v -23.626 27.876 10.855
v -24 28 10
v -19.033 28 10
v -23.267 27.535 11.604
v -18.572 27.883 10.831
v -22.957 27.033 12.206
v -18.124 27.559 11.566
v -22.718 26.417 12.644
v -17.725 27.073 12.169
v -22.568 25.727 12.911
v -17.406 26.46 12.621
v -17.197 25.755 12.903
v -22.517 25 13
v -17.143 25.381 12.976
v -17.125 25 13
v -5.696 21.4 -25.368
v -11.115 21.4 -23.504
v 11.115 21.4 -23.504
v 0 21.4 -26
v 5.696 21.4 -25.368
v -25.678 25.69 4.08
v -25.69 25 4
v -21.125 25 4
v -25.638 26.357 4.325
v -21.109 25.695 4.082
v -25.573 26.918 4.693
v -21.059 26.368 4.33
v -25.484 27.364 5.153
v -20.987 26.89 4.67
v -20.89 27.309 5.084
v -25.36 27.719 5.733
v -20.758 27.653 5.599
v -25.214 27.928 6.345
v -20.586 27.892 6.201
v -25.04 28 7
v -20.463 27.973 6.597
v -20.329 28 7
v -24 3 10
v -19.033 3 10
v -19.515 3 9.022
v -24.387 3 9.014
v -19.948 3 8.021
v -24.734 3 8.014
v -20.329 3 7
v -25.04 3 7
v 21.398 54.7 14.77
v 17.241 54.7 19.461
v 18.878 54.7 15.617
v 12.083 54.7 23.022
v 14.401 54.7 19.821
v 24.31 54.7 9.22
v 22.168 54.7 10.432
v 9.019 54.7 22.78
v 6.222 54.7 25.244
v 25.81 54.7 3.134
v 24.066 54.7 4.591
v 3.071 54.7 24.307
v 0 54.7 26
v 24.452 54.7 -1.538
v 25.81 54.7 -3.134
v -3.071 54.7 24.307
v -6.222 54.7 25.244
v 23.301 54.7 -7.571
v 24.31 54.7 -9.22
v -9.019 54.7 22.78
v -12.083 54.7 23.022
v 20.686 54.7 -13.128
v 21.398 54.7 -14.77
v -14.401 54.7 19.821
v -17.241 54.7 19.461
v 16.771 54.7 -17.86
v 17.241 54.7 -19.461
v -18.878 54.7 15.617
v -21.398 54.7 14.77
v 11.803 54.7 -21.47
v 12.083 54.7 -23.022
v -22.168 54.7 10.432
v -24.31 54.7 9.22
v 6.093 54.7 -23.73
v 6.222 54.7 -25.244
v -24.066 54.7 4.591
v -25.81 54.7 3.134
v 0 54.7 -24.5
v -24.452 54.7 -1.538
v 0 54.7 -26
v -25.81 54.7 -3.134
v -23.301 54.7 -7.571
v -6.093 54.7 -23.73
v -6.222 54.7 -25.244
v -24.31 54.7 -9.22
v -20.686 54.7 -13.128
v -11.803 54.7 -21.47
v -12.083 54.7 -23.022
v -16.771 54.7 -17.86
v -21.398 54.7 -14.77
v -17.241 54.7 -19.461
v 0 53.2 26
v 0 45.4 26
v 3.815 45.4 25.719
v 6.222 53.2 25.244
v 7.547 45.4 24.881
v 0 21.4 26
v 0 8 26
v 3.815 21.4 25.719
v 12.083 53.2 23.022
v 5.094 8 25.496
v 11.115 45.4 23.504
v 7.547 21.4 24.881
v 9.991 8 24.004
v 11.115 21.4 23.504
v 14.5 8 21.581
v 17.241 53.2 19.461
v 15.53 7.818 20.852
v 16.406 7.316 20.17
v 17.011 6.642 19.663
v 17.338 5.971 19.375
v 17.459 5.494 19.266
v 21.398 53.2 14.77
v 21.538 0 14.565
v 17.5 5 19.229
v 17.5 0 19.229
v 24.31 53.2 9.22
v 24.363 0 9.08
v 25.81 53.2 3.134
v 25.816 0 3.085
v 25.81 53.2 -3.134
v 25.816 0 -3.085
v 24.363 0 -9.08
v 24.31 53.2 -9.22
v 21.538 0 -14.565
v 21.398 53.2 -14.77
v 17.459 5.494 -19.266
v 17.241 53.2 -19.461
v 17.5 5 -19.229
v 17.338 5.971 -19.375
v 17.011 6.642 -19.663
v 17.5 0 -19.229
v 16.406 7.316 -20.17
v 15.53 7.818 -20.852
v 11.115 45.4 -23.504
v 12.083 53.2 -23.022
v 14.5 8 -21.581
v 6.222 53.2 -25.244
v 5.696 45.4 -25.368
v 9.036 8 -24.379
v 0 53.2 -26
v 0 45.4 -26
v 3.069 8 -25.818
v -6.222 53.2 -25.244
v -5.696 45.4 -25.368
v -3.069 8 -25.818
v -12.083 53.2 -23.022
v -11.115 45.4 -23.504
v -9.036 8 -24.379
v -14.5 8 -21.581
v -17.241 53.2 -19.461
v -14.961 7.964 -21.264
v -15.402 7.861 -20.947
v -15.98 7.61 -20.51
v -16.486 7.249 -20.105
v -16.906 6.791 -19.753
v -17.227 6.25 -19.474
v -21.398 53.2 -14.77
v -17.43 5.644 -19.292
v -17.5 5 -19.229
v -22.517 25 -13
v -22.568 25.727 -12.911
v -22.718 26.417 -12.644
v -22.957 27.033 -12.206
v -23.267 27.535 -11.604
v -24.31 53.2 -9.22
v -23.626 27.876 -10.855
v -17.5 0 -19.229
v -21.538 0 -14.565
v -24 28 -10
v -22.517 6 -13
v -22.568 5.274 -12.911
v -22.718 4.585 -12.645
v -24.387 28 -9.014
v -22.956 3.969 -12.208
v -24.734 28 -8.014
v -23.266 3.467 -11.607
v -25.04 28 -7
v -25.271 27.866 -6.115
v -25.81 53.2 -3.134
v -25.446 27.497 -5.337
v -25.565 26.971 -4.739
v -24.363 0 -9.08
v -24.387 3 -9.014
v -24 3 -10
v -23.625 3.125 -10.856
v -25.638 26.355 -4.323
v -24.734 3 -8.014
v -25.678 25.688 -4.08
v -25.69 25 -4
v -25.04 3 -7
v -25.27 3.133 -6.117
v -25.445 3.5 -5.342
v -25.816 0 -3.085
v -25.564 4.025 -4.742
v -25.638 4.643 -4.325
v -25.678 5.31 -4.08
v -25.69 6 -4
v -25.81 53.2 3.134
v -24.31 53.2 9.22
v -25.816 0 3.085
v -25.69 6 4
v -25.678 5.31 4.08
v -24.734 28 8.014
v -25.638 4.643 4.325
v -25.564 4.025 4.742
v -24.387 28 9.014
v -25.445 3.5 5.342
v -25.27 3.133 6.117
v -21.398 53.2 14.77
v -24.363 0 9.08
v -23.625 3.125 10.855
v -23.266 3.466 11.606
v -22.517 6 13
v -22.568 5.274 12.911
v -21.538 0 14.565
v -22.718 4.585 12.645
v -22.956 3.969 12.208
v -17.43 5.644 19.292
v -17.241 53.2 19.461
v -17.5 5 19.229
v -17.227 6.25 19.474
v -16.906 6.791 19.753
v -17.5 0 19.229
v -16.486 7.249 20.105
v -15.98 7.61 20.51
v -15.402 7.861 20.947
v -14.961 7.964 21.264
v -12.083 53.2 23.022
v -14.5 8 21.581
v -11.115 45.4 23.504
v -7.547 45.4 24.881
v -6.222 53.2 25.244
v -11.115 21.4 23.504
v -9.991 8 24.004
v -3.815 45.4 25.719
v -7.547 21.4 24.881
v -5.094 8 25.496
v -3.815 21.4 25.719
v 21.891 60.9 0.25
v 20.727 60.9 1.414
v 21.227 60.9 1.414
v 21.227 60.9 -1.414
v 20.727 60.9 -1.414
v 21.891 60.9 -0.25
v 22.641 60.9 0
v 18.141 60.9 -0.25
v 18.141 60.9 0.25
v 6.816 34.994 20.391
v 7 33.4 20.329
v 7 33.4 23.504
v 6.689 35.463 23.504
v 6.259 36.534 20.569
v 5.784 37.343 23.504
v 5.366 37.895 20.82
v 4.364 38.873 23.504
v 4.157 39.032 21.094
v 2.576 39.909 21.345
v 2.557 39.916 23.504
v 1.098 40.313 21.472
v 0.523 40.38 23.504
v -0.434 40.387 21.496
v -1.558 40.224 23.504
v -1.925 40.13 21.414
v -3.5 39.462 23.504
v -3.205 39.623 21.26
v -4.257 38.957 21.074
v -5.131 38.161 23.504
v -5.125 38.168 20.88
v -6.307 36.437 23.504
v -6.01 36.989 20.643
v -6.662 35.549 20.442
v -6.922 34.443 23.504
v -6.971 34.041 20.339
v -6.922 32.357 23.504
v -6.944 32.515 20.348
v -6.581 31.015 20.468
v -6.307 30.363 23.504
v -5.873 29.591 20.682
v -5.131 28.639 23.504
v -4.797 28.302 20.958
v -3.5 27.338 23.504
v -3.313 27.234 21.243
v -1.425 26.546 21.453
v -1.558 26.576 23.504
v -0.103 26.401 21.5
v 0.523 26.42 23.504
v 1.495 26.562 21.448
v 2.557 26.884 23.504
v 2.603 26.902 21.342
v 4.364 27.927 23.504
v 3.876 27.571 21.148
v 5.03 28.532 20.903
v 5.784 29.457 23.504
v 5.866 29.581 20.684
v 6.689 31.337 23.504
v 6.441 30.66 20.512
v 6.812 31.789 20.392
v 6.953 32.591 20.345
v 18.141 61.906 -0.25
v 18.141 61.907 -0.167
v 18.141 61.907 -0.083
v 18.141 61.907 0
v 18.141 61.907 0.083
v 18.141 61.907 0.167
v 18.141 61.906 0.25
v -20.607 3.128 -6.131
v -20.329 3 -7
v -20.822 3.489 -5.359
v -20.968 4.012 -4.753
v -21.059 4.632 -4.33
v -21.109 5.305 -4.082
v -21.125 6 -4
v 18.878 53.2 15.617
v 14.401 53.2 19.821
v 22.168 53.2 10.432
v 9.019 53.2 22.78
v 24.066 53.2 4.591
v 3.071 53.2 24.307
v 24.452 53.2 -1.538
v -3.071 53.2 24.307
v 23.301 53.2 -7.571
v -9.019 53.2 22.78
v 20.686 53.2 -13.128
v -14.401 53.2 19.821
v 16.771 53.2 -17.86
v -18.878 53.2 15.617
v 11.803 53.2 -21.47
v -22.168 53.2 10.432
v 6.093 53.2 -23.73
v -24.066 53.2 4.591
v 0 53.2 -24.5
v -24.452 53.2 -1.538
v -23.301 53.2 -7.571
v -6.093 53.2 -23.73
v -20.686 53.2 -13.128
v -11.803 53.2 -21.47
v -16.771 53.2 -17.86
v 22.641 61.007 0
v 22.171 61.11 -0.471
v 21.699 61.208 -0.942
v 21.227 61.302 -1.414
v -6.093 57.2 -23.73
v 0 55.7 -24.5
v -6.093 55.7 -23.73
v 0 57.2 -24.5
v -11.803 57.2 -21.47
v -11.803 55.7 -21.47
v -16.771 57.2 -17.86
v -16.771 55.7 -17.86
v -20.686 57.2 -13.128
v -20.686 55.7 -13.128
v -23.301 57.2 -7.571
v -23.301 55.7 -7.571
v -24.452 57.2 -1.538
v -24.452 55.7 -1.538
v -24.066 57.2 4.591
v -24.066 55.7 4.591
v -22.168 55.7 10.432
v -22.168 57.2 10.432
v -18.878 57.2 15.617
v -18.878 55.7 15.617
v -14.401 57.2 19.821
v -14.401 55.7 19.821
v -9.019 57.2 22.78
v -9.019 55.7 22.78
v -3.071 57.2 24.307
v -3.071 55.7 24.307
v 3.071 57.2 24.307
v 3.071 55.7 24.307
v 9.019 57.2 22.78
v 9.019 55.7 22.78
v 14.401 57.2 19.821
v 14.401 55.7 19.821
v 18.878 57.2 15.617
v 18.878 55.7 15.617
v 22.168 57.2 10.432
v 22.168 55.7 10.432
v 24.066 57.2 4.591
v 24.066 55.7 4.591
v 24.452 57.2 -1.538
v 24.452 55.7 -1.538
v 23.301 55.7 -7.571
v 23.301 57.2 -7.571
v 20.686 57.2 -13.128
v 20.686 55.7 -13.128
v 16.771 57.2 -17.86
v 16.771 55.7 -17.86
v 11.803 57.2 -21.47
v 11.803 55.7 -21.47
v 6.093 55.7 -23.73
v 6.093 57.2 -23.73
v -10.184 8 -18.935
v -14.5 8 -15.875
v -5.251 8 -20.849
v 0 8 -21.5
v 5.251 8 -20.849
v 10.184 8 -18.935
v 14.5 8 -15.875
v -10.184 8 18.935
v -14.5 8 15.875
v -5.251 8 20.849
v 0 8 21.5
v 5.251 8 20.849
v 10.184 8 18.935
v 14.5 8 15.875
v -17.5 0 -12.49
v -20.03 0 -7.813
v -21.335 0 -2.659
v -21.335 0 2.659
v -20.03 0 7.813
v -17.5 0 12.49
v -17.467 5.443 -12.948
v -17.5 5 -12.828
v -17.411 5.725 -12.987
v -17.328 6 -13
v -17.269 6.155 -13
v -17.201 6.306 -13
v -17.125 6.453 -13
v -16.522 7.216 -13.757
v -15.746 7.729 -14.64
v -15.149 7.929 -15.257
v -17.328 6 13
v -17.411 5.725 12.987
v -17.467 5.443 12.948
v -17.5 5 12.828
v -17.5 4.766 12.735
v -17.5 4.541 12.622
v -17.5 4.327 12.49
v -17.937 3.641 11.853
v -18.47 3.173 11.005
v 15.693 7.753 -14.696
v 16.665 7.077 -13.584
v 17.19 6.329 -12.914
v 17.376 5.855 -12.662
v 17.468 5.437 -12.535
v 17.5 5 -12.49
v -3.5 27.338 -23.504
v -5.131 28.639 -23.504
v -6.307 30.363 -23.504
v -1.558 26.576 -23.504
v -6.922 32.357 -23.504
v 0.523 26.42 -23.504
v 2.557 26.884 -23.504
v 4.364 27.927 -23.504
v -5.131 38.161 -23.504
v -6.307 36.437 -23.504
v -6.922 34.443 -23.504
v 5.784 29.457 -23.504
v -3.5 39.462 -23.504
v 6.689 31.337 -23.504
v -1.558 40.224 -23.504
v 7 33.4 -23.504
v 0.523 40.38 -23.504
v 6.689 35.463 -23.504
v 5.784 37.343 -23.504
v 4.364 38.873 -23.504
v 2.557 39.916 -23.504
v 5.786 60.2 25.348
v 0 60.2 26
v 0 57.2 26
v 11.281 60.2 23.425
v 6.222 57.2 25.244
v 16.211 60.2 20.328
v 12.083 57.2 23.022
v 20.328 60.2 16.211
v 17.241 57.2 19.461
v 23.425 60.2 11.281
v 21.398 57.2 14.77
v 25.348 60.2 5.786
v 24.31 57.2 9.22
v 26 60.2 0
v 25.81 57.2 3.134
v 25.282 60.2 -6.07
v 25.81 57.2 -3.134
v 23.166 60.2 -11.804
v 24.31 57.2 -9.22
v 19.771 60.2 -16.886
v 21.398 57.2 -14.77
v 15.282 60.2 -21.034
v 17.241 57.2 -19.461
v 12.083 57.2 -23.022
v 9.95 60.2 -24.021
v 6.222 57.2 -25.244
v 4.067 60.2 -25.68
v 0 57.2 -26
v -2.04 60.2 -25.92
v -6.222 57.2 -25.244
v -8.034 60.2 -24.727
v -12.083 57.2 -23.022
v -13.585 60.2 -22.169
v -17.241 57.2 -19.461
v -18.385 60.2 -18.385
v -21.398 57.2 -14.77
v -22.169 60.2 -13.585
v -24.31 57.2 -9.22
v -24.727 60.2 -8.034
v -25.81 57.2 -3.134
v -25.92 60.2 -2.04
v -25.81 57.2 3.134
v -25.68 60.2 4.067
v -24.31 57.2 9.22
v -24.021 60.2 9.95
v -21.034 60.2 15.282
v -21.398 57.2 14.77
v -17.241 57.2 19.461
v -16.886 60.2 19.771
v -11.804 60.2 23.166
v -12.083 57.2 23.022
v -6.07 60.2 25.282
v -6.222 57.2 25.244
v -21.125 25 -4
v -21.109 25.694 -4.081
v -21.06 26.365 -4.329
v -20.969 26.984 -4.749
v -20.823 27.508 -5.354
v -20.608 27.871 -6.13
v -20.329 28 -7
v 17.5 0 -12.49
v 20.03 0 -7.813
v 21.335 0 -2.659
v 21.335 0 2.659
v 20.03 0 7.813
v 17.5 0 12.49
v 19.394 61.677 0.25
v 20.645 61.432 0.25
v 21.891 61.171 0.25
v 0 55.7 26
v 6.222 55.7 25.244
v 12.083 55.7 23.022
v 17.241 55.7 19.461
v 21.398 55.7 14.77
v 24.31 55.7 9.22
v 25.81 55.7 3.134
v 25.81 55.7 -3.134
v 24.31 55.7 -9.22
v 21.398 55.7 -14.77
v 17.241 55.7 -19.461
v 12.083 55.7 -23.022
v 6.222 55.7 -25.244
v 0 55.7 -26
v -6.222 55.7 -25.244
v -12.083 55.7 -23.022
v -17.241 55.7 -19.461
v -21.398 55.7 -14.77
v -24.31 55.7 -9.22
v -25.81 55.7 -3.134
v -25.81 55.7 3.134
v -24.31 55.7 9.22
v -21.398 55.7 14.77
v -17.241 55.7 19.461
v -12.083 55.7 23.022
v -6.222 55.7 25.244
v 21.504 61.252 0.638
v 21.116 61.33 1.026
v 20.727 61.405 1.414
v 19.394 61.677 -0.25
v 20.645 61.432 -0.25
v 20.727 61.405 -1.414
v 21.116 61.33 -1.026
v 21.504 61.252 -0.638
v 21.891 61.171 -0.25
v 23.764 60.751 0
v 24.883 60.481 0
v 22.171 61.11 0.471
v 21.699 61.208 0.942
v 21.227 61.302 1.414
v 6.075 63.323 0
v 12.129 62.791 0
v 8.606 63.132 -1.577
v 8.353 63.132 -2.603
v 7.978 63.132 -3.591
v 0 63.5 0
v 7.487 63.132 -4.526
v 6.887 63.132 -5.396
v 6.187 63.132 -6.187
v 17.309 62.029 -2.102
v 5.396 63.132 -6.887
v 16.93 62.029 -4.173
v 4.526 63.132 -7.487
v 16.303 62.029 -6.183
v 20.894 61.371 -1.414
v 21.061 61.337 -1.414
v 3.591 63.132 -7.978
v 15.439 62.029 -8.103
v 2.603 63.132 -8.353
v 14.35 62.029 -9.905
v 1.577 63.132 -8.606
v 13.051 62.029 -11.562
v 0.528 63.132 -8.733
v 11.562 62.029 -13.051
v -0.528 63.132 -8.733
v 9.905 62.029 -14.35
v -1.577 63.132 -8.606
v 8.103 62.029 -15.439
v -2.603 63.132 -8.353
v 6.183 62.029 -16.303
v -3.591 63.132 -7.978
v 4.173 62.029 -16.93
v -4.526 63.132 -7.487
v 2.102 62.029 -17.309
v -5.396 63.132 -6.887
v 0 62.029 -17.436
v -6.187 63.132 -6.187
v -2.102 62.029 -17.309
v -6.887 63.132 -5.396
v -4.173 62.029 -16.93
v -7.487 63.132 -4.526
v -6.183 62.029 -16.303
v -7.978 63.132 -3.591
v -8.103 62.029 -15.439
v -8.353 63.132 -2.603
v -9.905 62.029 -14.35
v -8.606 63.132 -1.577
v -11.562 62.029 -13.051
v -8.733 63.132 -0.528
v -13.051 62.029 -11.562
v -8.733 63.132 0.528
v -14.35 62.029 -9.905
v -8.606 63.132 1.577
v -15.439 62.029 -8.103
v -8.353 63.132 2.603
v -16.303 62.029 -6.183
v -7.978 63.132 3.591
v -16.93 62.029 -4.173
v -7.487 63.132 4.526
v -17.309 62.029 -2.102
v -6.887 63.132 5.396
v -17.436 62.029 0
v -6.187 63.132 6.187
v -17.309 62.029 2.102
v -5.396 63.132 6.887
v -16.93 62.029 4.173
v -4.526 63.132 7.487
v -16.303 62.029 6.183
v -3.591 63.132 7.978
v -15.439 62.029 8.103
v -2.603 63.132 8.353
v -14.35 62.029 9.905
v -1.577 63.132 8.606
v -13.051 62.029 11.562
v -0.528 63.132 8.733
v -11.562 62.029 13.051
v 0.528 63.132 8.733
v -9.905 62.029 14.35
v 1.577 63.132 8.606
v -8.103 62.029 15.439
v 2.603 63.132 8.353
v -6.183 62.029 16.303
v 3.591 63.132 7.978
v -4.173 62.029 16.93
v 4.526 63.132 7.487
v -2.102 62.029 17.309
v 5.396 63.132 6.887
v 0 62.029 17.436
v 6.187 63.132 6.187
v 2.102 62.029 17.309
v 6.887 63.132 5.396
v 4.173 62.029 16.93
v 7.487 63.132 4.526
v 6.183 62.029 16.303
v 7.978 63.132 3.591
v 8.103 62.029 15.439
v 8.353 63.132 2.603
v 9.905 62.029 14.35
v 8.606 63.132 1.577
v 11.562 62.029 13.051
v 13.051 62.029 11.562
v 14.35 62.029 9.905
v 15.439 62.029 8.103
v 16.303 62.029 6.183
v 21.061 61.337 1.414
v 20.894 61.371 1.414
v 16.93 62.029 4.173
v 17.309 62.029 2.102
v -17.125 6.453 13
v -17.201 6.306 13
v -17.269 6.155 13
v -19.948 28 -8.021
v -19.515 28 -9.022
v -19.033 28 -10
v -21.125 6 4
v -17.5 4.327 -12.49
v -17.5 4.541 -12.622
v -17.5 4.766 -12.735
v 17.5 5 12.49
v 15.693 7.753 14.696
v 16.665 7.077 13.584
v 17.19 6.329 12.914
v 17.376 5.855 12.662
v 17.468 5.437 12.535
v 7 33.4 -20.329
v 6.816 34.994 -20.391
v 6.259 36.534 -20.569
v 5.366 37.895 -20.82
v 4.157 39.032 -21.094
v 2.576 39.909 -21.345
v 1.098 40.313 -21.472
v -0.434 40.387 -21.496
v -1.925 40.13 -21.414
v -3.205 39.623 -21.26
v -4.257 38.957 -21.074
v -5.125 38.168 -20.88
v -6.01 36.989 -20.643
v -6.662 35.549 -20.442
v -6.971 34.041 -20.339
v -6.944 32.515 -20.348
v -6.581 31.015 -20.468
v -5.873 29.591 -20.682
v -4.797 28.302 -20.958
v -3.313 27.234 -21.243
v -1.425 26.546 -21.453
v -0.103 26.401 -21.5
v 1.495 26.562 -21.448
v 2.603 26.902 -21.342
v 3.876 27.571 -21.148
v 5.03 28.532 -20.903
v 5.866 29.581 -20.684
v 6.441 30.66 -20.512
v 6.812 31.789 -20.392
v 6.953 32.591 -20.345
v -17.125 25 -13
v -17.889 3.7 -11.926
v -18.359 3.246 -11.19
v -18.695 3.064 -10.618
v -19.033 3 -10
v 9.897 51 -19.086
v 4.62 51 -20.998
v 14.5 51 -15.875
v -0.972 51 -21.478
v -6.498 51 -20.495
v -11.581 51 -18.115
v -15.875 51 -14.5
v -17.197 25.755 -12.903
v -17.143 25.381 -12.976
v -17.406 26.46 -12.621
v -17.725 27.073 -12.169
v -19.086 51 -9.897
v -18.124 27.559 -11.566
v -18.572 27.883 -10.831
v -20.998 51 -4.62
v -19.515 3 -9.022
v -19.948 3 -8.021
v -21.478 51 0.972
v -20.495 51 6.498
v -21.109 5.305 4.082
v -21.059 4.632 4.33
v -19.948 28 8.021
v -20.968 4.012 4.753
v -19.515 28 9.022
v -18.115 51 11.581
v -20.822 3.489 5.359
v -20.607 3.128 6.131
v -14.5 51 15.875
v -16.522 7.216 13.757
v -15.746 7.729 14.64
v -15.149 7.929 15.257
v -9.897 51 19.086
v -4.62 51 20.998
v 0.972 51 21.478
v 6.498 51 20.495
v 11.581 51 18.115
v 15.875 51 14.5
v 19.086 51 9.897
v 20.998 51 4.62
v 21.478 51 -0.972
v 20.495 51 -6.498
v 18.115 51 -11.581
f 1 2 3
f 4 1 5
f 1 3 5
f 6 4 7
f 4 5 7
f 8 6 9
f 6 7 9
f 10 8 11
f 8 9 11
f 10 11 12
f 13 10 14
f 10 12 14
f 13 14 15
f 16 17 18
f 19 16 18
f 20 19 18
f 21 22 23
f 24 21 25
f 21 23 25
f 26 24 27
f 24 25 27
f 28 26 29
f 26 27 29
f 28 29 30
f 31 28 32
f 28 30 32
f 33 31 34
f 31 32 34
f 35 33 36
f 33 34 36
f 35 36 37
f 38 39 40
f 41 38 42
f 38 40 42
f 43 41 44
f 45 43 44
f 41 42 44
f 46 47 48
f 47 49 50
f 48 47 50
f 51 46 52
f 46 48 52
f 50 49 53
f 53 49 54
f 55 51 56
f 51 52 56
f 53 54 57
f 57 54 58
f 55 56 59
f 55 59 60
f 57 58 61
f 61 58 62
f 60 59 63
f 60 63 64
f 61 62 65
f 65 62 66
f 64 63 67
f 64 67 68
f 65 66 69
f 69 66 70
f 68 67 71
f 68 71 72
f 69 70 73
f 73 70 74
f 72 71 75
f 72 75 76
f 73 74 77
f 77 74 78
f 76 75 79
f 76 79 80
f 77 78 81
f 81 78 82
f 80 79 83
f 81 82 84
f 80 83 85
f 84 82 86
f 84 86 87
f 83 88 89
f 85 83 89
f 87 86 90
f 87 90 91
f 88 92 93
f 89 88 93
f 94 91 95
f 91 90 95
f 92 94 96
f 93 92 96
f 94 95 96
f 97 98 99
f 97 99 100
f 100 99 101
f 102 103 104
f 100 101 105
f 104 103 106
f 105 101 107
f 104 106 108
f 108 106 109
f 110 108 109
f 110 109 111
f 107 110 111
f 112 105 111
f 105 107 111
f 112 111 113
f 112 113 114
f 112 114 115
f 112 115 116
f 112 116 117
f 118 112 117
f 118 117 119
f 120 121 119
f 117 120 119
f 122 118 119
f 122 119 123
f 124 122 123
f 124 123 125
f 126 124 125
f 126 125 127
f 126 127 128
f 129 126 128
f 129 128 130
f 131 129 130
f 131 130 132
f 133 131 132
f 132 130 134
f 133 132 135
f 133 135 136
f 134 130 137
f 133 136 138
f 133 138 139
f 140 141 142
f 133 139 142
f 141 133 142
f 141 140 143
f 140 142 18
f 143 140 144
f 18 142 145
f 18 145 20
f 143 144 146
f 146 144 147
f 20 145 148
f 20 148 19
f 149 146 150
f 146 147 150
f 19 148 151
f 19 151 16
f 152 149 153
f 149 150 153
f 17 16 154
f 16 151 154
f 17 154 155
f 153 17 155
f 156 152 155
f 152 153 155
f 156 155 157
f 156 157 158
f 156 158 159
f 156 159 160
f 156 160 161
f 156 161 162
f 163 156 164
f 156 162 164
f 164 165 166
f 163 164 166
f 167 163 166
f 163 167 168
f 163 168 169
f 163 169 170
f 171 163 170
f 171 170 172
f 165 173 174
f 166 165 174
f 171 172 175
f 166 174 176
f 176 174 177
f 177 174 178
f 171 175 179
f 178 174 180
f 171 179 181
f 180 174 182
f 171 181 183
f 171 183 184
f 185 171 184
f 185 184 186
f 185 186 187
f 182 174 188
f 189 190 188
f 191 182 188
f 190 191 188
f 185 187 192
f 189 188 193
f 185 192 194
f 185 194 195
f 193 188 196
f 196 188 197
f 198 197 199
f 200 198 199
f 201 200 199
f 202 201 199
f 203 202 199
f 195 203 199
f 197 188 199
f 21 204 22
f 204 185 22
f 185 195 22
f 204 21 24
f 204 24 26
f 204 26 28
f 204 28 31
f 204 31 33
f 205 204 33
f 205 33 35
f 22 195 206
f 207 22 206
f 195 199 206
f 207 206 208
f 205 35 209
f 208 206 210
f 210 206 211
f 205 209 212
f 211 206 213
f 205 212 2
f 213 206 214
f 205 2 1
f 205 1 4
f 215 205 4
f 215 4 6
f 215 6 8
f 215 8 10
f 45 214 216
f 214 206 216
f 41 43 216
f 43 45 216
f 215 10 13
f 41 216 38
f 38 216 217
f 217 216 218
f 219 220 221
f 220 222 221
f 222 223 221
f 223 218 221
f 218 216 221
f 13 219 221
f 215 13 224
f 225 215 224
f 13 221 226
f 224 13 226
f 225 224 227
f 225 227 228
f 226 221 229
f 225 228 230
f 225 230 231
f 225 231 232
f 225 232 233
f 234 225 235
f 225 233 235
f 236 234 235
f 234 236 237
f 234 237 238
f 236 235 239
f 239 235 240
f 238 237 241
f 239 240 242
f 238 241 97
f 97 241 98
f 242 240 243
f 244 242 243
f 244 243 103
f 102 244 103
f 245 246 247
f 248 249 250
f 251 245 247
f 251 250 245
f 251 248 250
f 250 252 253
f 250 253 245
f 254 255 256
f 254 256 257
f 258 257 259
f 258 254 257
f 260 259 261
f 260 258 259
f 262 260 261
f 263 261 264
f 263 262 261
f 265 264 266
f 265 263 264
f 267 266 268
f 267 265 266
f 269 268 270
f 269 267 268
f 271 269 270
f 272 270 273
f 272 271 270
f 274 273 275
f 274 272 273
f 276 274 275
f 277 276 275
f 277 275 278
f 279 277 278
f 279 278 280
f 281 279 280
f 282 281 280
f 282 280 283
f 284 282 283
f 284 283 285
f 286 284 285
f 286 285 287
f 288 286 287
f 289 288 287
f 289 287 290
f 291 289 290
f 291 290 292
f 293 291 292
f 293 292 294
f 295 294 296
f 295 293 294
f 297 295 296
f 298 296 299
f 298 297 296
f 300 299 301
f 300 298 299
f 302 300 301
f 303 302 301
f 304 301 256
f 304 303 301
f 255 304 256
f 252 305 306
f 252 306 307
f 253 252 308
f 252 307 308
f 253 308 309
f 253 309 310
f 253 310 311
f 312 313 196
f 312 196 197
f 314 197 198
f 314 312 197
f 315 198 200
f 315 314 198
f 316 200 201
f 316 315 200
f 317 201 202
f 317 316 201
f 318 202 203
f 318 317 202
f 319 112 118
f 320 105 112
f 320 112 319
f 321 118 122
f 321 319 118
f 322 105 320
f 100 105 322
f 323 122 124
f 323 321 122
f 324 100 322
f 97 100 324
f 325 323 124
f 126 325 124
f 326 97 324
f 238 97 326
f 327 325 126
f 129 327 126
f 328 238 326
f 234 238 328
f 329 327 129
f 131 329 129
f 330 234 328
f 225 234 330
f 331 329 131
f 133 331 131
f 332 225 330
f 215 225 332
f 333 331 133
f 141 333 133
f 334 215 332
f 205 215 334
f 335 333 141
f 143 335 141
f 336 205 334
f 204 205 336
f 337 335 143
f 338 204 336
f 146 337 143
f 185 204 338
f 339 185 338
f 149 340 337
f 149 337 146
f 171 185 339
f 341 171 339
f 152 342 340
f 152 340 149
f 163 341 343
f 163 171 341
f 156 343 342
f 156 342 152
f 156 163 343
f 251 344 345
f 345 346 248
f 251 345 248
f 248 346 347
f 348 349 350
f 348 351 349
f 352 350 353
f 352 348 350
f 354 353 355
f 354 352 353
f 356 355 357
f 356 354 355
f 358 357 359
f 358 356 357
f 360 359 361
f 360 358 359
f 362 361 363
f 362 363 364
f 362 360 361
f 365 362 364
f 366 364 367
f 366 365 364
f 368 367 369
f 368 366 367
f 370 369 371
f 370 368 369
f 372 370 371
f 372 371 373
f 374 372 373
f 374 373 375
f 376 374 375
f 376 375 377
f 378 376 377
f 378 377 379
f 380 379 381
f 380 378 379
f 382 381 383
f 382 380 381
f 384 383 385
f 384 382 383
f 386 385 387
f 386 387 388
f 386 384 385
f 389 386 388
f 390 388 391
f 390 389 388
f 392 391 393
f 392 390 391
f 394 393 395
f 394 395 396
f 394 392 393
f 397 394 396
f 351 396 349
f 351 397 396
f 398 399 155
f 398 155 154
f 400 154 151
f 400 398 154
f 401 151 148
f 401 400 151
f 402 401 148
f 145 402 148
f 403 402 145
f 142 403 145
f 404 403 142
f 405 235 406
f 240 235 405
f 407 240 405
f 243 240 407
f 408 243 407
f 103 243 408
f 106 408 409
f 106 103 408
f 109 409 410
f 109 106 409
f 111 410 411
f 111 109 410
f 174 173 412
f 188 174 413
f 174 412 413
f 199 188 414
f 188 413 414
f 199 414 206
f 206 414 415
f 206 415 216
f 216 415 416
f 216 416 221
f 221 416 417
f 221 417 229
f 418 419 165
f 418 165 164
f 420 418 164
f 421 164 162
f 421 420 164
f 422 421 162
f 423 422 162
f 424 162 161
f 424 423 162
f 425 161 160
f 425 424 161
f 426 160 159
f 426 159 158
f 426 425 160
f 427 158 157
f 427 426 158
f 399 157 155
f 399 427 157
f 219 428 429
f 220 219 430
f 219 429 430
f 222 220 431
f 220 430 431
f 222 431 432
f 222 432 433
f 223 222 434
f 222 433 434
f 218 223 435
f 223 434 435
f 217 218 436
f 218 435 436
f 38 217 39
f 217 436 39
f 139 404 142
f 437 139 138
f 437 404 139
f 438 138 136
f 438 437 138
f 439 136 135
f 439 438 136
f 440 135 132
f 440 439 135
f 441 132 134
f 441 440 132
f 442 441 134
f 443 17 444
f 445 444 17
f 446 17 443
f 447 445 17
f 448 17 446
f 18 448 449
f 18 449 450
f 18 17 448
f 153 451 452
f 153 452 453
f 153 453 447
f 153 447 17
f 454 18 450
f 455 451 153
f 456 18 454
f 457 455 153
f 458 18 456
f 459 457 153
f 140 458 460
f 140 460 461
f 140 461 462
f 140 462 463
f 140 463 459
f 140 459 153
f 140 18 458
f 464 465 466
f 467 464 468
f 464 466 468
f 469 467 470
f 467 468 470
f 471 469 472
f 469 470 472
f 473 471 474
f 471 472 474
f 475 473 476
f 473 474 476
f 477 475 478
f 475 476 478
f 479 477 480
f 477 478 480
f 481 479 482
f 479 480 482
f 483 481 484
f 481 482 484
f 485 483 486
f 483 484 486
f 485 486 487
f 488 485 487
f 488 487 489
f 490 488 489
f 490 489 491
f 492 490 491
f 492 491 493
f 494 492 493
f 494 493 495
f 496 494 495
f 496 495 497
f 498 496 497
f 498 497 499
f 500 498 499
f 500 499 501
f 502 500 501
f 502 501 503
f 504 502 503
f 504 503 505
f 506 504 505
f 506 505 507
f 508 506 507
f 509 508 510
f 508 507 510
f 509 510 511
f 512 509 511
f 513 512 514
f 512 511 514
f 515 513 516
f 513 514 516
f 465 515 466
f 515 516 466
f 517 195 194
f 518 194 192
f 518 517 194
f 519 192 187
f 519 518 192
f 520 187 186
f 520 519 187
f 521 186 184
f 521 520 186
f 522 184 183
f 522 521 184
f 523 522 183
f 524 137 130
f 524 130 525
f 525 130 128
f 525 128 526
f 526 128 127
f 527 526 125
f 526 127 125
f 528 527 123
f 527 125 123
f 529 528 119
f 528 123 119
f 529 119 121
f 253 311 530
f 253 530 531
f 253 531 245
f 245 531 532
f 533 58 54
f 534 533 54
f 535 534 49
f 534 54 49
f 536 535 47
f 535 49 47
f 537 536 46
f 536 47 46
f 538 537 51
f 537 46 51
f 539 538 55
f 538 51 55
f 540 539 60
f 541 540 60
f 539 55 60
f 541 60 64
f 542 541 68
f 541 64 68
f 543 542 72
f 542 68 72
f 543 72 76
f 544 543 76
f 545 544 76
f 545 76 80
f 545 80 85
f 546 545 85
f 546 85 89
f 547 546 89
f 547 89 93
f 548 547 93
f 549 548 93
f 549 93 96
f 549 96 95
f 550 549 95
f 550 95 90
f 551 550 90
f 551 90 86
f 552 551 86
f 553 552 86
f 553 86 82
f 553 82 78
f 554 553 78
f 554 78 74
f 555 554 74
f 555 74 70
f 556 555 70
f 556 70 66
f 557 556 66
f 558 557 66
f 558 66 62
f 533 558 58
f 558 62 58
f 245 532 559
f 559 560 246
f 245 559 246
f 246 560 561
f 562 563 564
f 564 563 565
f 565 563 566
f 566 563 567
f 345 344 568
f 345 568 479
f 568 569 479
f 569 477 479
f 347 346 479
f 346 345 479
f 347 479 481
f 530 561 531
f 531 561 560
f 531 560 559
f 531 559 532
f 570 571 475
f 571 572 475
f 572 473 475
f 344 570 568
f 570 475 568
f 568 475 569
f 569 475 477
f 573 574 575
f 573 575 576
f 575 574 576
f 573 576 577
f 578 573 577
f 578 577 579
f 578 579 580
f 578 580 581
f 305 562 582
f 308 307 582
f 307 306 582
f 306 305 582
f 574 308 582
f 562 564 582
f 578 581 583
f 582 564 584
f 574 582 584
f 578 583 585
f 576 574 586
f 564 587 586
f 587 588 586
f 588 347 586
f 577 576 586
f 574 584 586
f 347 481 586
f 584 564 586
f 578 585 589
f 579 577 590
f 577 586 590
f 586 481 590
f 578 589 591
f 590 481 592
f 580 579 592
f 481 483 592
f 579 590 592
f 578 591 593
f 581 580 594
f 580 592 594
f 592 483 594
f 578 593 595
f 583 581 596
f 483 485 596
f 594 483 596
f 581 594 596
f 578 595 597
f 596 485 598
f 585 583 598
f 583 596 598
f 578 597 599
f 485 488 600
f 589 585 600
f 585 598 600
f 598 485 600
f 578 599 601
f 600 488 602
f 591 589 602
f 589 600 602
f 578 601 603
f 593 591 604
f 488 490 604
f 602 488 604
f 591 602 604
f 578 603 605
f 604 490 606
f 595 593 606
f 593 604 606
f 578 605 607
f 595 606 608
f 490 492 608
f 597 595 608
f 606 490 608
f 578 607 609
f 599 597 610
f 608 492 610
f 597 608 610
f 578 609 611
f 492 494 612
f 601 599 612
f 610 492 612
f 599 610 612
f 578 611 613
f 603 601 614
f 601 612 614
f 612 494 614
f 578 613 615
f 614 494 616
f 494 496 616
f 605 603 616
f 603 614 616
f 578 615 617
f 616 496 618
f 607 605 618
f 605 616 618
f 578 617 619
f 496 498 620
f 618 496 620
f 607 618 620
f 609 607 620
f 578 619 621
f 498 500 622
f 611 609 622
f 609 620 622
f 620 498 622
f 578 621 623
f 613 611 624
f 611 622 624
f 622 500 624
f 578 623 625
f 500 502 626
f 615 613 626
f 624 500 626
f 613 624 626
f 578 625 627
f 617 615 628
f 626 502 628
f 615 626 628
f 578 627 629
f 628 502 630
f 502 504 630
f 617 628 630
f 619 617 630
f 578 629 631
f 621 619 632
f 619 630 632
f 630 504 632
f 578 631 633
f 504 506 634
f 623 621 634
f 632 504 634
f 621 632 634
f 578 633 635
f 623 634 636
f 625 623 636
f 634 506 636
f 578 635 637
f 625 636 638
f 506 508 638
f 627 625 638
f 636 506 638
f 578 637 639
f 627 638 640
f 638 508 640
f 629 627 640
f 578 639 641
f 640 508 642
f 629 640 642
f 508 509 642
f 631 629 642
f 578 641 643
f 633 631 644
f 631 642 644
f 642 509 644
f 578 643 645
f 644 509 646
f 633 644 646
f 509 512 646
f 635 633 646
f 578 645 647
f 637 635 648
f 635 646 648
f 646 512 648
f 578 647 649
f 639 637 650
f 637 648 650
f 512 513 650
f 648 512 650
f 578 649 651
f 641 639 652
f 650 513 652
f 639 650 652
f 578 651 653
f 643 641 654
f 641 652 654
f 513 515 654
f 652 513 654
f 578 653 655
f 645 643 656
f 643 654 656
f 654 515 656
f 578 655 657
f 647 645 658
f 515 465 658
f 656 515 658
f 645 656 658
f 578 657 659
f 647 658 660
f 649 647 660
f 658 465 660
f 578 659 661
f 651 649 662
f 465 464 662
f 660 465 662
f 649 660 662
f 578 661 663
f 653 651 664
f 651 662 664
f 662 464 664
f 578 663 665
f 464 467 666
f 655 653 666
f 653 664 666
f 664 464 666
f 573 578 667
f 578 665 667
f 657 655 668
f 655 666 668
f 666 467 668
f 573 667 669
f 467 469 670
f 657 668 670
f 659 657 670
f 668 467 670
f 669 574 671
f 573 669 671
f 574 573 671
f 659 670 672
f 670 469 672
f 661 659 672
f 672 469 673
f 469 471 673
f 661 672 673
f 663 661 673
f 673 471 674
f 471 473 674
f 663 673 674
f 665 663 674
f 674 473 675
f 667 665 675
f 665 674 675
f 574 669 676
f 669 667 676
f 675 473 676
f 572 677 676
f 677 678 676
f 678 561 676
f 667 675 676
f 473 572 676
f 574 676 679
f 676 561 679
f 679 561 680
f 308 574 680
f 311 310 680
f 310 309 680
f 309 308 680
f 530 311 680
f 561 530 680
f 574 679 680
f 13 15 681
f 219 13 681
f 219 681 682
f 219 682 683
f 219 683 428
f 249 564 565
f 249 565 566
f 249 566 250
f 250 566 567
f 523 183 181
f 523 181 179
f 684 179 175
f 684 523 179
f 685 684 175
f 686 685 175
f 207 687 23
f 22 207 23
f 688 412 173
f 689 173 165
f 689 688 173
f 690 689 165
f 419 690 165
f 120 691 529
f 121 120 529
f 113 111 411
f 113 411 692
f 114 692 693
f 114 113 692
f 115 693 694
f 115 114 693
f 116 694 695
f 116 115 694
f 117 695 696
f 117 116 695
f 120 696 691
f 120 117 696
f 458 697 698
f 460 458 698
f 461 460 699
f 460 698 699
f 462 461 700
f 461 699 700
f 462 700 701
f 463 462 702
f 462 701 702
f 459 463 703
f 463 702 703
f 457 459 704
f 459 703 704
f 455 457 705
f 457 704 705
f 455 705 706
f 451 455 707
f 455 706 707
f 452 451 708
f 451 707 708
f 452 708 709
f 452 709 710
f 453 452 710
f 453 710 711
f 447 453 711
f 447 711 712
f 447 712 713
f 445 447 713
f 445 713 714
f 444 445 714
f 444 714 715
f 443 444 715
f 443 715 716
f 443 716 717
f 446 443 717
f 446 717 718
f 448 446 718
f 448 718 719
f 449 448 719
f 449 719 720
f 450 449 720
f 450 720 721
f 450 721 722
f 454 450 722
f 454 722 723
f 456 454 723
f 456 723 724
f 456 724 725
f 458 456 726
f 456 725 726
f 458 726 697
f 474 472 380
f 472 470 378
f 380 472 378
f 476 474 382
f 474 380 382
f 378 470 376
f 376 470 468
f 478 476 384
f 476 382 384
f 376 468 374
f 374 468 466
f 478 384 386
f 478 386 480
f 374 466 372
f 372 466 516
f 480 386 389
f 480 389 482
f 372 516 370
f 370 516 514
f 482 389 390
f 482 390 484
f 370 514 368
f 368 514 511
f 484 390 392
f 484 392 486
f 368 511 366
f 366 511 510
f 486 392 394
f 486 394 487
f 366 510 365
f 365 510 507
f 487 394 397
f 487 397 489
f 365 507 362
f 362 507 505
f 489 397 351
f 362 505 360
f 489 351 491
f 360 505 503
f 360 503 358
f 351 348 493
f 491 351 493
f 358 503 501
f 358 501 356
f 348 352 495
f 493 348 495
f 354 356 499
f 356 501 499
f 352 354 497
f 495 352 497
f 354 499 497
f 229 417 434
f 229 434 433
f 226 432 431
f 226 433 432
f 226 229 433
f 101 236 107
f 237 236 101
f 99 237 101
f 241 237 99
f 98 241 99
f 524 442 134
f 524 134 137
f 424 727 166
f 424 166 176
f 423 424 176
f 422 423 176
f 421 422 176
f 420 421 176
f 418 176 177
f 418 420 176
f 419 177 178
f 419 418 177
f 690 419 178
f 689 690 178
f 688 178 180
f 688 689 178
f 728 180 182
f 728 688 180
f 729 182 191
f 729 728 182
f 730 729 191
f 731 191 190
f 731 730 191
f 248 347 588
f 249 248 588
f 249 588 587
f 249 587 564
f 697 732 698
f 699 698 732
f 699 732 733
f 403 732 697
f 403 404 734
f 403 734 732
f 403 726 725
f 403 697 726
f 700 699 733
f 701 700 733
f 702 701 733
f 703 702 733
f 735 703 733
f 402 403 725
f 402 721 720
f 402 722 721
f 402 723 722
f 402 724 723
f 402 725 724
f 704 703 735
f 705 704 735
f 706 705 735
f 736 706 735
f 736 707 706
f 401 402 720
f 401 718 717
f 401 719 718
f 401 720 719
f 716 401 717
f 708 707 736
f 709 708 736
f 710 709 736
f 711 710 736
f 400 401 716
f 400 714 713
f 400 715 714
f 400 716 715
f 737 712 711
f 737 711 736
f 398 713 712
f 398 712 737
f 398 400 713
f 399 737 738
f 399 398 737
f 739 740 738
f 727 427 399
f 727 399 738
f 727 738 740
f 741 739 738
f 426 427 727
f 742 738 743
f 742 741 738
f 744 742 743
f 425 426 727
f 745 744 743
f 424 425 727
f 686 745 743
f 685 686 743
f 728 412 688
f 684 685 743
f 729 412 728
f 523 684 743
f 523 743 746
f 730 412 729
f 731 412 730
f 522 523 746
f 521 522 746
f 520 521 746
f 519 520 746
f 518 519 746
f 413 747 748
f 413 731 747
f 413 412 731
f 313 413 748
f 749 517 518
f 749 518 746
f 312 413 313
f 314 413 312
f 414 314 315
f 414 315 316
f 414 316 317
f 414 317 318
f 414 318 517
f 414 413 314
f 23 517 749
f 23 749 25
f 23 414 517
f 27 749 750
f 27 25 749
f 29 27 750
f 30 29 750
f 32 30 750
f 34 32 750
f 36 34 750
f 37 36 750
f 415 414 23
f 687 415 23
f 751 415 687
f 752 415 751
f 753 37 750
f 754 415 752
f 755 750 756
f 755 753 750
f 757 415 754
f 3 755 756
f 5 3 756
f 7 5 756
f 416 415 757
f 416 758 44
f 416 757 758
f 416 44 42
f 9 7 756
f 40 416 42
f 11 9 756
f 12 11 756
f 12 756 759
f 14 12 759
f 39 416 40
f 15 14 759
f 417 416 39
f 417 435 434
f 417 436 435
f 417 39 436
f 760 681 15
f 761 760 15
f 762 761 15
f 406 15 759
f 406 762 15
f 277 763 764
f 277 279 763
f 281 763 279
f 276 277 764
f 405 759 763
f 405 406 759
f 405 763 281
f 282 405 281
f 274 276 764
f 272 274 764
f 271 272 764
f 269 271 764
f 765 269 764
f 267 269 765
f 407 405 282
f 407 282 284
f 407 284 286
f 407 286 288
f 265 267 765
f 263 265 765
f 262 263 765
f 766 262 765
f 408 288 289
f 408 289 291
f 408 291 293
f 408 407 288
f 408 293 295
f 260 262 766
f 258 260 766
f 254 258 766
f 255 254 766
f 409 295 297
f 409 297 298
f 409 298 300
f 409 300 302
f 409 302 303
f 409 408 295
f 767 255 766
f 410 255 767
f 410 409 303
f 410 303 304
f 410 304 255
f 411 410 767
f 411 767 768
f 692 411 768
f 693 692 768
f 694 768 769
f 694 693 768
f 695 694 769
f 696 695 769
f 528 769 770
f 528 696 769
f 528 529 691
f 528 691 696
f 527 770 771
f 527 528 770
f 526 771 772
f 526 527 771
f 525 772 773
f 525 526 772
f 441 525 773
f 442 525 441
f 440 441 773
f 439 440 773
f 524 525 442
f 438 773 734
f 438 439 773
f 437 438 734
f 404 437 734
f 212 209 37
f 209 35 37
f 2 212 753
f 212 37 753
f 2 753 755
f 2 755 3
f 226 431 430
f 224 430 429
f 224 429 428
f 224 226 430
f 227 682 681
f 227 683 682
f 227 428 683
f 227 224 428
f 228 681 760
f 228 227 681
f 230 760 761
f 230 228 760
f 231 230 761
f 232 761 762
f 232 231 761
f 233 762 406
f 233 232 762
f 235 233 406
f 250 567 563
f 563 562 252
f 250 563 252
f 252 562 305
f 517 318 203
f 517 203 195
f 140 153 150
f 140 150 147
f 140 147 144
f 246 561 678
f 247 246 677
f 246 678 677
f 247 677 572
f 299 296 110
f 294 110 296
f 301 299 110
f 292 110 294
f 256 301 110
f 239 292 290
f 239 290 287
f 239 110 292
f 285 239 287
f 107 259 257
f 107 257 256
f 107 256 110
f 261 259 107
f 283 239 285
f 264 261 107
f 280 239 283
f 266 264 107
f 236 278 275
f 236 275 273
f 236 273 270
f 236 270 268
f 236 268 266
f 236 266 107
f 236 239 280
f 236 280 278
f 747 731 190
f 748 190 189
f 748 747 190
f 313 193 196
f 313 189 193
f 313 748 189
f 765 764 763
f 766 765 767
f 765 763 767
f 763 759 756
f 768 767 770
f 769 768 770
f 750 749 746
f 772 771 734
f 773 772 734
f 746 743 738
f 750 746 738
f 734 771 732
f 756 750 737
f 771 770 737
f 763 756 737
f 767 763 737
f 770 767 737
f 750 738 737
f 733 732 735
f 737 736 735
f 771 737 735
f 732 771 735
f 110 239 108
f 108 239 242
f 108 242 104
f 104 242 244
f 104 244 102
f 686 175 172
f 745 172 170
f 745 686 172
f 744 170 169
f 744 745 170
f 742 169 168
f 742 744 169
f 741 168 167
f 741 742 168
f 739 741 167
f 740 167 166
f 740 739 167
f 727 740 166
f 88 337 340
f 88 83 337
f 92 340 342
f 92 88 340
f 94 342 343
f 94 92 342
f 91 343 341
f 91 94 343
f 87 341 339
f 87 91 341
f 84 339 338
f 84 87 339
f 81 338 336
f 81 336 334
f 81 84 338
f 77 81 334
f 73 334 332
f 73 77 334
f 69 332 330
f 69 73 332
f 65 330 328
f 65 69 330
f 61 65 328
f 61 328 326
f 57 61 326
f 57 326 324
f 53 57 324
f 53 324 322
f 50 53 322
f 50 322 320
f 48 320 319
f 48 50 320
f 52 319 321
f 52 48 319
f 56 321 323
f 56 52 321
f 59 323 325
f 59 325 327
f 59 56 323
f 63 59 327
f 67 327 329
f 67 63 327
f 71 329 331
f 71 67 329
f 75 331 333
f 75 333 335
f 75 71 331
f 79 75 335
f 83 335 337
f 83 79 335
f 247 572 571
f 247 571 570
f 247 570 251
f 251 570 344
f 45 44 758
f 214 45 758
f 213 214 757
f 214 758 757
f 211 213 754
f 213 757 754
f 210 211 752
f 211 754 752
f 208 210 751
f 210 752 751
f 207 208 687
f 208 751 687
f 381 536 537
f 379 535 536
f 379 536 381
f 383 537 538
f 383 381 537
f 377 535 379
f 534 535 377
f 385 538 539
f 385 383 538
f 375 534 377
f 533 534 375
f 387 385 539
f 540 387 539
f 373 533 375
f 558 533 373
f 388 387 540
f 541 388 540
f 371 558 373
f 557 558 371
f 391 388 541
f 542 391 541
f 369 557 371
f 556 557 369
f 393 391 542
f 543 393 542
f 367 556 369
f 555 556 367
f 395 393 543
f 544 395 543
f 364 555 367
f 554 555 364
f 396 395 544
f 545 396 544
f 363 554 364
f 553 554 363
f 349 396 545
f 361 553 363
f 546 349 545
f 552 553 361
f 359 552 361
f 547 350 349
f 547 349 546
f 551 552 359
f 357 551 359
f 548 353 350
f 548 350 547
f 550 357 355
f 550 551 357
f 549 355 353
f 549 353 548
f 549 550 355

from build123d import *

# Parameters (mm, degrees)
SKETCH_1_R          = 26
EXTRUDE_1_DEPTH     = 60.2
SKETCH_3_R          = 7
CUT_EXTRUDE_1_DEPTH = 30.1
SKETCH_4_R          = 21.5
CUT_EXTRUDE_2_DEPTH = 51
SKETCH_5_W          = 1.5
SKETCH_5_H          = 1.5
CUT_EXTRUDE_3_DEPTH = 50
SKETCH_9_W          = 5.5
SKETCH_9_H          = 24
CUT_EXTRUDE_4_DEPTH = 25
CUT_EXTRUDE_5_DEPTH = 2.1


with BuildPart() as part:
    # Эскиз1 → Бобышка-Вытянуть1 (new body)
    with BuildSketch(Plane(origin=(0, 0, 0), x_dir=(1, 0, 0), z_dir=(0, 1, 0))):
        with Locations(Location((0, 0, 0), (0, 0, 270))):
            Circle(SKETCH_1_R)
    extrude(amount=EXTRUDE_1_DEPTH)

    # Эскиз2 → Повернуть1 (revolve)
    with BuildSketch(Plane.XY):
        with BuildLine():
            Line((26, 60.2), (0, 60.2))
            Line((0, 60.2), (0, 63.5))
            ThreePointArc((0, 63.5), (13.10429319, 62.671703918), (26, 60.2))
        make_face()
    revolve(axis=Axis((0, 60.2, 0), (0, 1, 0)))

    # Эскиз3 → Вырез-Вытянуть1 (cut, symmetric)
    with BuildSketch(Plane.XY):
        with Locations((0, 33.4)):
            Circle(SKETCH_3_R)
        with BuildLine():
            Line((17.5, 0), (-17.5, 0))
            Line((-17.5, 0), (-17.5, 5))
            ThreePointArc((-17.5, 5), (-16.621320344, 7.121320344), (-14.5, 8))
            Line((-14.5, 8), (14.5, 8))
            ThreePointArc((14.5, 8), (16.621320344, 7.121320344), (17.5, 5))
            Line((17.5, 5), (17.5, 0))
        make_face()
    extrude(amount=CUT_EXTRUDE_1_DEPTH, both=True, mode=Mode.SUBTRACT)

    # Эскиз4 → Вырез-Вытянуть2 (cut)
    with BuildSketch(Plane(origin=(0, 0, 0), x_dir=(1, 0, 0), z_dir=(0, 1, 0))):
        with Locations(Location((0, 0, 0), (0, 0, 47.590982222))):
            Circle(SKETCH_4_R)
    extrude(amount=CUT_EXTRUDE_2_DEPTH, mode=Mode.SUBTRACT)

    # Эскиз5 → Вырез-Повернуть1 (revolve, cut)
    with BuildSketch(Plane.XY, mode=Mode.PRIVATE) as cut_revolve_1_sk:
        with Locations((-25.25, 56.45)):
            Rectangle(SKETCH_5_W, SKETCH_5_H)
        with Locations((-25.25, 53.95)):
            Rectangle(SKETCH_5_W, SKETCH_5_H)
    revolve(cut_revolve_1_sk.sketch.rotate(Axis((0, 37.032198444, 0), (0, 1, 0)), 270), axis=Axis((0, 37.032198444, 0), (0, 1, 0)), mode=Mode.SUBTRACT)

    # Эскиз6 → Вырез-Вытянуть3 (cut)
    with BuildSketch(Plane(origin=(0, 0, 0), x_dir=(0, 0, -1), z_dir=(1, 0, 0))):
        with BuildLine():
            Line((-4, 6), (-4, 25))
            ThreePointArc((-4, 25), (-4.878679656, 27.121320344), (-7, 28))
            Line((-7, 28), (-10, 28))
            ThreePointArc((-10, 28), (-12.121320344, 27.121320344), (-13, 25))
            Line((-13, 25), (-13, 6))
            ThreePointArc((-13, 6), (-12.121320344, 3.878679656), (-10, 3))
            Line((-10, 3), (-7, 3))
            ThreePointArc((-7, 3), (-4.878679656, 3.878679656), (-4, 6))
        make_face()
        with BuildLine():
            Line((10, 3), (7, 3))
            ThreePointArc((7, 3), (4.878679656, 3.878679656), (4, 6))
            Line((4, 6), (4, 25))
            ThreePointArc((4, 25), (4.878679656, 27.121320344), (7, 28))
            Line((7, 28), (10, 28))
            ThreePointArc((10, 28), (12.121320344, 27.121320344), (13, 25))
            Line((13, 25), (13, 6))
            ThreePointArc((13, 6), (12.121320344, 3.878679656), (10, 3))
        make_face()
    extrude(amount=-CUT_EXTRUDE_3_DEPTH, mode=Mode.SUBTRACT)

    # Эскиз9 → Вырез-Вытянуть4 (cut, symmetric)
    with BuildSketch(Plane(origin=(0, 0, 0), x_dir=(0, 0, -1), z_dir=(1, 0, 0))):
        with Locations((-26.254259625, 33.4)):
            Rectangle(SKETCH_9_W, SKETCH_9_H)
        with Locations((26.254259625, 33.4)):
            Rectangle(SKETCH_9_W, SKETCH_9_H)
    extrude(amount=CUT_EXTRUDE_4_DEPTH, both=True, mode=Mode.SUBTRACT)

    # Эскиз10 → Вырез-Вытянуть5 (cut)
    with BuildSketch(Plane(origin=(0, 63, 0), x_dir=(1, 0, 0), z_dir=(0, 1, 0))):
        Polygon((22.641485295, 0), (21.227271732, 1.414213562), (20.727271732, 1.414213562), (21.891485295, 0.25), (18.141485295, 0.25), (18.141485295, -0.25), (21.891485295, -0.25), (20.727271732, -1.414213562), (21.227271732, -1.414213562), align=None)
    extrude(amount=-CUT_EXTRUDE_5_DEPTH, mode=Mode.SUBTRACT)


solid = part.part
